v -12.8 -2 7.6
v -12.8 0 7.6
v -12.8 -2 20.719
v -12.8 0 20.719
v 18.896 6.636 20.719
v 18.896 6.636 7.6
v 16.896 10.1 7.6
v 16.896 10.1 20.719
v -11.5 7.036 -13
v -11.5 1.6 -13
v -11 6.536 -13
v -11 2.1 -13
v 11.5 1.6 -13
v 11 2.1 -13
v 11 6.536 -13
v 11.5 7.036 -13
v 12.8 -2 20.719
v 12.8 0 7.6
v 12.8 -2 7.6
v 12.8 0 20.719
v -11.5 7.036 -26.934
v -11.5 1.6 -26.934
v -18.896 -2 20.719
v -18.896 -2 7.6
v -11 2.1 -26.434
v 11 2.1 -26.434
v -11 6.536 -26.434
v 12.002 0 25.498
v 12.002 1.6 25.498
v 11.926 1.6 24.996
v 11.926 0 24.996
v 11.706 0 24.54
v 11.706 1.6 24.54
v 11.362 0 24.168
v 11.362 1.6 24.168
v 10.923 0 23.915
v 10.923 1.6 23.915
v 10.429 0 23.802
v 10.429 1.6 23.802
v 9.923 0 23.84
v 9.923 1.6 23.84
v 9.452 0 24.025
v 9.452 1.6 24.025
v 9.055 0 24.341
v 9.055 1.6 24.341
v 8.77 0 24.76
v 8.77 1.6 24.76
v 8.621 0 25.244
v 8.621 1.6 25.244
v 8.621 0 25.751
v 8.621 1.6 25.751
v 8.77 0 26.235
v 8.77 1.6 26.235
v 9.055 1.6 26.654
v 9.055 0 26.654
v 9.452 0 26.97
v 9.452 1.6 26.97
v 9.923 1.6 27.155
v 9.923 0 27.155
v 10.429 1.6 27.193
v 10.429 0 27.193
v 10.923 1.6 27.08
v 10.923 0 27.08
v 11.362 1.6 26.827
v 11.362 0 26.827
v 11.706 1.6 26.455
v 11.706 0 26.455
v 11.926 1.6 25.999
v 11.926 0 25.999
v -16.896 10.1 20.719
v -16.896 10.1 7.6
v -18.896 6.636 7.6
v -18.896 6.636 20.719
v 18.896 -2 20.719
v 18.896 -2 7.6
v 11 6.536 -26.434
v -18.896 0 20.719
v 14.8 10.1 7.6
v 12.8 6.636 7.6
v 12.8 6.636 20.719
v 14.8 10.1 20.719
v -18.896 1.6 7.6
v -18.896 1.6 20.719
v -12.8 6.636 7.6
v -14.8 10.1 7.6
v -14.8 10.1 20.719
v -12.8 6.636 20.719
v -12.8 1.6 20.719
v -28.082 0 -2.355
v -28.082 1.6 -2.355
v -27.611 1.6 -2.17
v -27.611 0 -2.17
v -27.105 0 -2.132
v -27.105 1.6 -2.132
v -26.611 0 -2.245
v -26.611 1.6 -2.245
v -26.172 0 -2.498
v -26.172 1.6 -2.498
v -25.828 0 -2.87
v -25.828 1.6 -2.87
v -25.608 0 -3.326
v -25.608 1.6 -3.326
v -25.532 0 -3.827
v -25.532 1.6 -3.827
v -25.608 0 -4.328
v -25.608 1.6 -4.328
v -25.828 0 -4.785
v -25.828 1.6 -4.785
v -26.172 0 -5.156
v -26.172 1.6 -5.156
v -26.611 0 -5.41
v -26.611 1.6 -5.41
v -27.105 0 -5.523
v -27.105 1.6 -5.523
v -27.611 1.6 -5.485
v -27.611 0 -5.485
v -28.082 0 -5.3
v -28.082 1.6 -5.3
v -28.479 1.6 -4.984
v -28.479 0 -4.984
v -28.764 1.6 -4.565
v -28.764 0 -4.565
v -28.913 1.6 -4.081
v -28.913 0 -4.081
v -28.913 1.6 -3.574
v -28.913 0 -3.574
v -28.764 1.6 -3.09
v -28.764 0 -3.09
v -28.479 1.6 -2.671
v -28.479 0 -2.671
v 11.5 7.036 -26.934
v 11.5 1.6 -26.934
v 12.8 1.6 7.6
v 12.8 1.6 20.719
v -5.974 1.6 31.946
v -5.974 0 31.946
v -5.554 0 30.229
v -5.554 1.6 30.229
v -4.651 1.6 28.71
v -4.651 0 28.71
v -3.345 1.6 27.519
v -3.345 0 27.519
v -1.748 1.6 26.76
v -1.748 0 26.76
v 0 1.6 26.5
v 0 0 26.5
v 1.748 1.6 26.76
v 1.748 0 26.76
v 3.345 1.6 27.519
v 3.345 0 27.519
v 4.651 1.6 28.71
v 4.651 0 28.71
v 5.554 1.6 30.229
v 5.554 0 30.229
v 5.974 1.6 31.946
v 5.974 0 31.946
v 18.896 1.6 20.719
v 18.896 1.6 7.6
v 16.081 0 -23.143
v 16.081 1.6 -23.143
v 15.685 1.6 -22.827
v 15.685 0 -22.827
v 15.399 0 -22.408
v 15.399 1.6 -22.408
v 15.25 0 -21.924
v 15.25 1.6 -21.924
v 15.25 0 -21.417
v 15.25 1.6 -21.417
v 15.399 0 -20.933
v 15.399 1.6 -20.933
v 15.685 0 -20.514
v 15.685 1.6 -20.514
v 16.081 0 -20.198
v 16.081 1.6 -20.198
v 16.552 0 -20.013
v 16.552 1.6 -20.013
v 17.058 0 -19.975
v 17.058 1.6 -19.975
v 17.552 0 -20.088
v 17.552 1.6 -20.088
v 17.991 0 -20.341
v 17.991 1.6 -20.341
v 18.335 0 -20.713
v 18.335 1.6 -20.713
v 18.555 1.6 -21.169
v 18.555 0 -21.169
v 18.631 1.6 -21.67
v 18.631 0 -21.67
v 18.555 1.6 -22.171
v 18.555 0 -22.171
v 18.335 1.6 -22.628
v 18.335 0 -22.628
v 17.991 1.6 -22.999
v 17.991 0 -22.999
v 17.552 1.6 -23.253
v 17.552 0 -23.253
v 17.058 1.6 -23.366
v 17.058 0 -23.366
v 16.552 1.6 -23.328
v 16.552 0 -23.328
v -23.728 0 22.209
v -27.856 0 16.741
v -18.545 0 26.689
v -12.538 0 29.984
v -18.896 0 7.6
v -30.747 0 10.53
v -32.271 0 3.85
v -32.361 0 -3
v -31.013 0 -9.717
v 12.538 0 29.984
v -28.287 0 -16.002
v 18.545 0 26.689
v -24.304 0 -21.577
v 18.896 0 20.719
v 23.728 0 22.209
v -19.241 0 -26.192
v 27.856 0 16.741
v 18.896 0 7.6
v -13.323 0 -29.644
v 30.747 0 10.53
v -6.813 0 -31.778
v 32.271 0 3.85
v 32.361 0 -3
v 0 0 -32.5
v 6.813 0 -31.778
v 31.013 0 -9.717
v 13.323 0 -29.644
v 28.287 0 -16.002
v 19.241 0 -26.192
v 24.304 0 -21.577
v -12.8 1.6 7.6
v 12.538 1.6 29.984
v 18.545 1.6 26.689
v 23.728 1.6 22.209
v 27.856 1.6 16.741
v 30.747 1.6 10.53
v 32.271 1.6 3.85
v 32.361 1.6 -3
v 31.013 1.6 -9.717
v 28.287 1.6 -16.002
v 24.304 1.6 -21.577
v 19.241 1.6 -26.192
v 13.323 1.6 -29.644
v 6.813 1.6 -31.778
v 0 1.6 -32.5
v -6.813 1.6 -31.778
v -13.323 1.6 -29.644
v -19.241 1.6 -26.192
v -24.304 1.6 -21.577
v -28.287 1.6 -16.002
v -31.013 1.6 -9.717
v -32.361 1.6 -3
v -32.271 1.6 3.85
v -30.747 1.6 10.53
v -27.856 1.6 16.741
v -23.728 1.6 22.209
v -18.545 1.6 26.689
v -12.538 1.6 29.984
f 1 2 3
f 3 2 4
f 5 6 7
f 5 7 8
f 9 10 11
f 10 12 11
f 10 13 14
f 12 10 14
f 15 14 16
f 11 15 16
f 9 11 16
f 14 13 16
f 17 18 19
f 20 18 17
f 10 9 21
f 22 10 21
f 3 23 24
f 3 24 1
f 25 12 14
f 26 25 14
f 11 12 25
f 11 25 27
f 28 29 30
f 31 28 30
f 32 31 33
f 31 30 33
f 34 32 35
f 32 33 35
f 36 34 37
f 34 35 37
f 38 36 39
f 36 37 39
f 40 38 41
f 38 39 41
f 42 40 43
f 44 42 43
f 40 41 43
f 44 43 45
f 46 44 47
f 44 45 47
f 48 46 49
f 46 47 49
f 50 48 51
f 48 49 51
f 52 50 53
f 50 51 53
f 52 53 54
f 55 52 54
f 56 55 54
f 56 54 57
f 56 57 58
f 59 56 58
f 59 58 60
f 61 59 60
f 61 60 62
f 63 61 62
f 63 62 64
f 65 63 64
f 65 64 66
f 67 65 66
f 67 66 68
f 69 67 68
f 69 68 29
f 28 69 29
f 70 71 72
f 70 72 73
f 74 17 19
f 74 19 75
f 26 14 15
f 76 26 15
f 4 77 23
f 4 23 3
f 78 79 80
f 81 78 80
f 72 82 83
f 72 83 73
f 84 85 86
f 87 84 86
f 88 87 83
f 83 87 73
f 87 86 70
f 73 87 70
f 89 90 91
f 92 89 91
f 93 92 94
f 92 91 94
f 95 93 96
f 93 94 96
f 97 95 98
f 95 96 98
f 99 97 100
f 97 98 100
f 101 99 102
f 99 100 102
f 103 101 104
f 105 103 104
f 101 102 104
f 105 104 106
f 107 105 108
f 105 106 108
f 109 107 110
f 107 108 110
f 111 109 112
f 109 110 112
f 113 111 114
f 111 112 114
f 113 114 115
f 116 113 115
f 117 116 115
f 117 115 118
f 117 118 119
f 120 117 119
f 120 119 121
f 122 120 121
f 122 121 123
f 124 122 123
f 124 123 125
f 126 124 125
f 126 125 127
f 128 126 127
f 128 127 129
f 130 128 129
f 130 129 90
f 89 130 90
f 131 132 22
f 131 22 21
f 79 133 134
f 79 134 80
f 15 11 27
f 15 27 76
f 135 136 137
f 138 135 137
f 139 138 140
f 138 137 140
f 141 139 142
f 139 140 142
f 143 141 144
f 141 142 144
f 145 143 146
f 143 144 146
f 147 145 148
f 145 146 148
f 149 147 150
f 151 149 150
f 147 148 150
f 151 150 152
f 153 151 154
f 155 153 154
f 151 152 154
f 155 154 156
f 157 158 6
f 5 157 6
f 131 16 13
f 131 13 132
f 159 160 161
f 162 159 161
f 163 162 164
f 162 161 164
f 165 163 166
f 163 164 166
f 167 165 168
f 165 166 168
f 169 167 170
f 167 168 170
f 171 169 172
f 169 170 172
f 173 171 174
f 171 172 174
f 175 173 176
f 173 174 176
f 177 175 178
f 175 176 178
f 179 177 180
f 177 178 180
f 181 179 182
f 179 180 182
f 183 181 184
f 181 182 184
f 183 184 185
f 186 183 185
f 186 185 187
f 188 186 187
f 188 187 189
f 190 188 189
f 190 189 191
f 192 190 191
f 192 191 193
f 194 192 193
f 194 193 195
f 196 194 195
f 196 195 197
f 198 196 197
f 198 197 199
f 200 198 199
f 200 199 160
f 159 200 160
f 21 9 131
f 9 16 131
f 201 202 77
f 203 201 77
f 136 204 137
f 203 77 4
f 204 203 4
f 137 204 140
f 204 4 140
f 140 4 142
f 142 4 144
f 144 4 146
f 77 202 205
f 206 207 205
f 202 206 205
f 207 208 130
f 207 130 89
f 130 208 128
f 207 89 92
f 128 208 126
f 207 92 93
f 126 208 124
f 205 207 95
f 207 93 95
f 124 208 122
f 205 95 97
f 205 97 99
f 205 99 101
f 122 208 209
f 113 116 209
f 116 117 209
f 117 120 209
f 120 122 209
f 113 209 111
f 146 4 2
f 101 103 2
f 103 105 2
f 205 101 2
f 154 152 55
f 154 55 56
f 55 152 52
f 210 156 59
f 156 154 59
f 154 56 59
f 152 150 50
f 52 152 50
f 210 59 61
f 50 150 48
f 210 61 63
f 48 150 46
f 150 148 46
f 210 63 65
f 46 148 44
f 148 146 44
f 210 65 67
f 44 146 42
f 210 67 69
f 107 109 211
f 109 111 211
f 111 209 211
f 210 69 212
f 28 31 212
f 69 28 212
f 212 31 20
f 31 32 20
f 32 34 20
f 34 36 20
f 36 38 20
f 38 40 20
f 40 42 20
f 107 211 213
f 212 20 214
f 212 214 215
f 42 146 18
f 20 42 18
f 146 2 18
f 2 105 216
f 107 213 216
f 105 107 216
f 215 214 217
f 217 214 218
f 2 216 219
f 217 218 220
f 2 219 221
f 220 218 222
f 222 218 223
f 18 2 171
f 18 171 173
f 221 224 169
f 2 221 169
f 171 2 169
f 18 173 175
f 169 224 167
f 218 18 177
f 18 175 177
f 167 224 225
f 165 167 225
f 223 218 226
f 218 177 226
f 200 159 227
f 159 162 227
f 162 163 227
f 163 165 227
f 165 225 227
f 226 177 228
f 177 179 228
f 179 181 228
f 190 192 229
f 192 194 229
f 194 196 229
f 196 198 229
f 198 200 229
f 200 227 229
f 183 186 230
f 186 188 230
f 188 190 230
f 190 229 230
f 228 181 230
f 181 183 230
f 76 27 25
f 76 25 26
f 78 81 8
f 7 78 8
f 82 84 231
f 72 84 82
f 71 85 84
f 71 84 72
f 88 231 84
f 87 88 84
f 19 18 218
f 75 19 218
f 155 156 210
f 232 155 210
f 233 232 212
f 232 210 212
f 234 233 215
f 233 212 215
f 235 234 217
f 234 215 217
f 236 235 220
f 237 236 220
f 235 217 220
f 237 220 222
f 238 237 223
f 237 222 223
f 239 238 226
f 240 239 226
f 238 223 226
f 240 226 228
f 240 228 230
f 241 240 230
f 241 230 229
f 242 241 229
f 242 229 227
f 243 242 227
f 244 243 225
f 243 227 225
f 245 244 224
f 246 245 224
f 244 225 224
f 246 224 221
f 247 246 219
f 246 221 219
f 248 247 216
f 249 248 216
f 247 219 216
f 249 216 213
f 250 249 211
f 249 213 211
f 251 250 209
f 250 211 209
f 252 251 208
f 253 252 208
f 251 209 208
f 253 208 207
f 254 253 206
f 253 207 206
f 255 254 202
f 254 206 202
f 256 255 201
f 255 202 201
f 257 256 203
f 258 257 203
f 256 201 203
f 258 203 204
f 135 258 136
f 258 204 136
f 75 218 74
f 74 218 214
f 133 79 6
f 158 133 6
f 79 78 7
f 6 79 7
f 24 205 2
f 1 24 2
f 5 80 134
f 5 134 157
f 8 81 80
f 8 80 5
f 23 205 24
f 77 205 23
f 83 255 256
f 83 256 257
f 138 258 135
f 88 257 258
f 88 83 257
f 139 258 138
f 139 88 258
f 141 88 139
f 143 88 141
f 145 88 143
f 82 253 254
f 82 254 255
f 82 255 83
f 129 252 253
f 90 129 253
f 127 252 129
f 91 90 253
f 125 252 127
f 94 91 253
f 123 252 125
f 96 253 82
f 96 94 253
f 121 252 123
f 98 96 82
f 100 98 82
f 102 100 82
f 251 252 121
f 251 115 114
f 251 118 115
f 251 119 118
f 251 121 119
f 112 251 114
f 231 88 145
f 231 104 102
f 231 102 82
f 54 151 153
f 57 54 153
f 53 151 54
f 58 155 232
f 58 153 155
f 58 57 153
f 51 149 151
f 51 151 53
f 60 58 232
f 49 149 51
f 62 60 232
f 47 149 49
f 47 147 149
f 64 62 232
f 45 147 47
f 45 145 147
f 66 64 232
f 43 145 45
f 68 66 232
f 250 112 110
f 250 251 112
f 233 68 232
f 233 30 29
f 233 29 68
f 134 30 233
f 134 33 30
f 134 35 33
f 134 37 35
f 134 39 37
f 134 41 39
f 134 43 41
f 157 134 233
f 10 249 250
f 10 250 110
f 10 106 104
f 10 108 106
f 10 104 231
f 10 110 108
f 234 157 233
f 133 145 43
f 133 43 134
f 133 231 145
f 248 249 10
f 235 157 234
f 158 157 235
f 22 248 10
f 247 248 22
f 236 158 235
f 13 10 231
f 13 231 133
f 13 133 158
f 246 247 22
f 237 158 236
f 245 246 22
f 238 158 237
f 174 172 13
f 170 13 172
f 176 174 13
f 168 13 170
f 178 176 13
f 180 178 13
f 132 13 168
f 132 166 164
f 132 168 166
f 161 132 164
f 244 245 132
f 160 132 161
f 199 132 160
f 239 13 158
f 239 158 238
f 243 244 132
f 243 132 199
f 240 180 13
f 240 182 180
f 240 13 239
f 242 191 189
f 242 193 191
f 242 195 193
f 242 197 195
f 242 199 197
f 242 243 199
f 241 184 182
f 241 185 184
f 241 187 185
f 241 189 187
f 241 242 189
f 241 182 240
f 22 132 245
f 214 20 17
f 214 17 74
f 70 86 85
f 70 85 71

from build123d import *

# Parameters (mm, degrees)
BOSS_EXTRUDE2_DEPTH       = 1.6
SKETCH3_R                 = 1.7
CUT_EXTRUDE1_DEPTH        = 2.6
CIRPATTERN1_COUNT         = 3
SKETCH4_W                 = 13.934293336
SKETCH4_H                 = 5.4356
BOSS_EXTRUDE3_DEPTH       = 11.5
SKETCH5_W                 = 6.096
SKETCH5_H                 = 8.5
BOSS_EXTRUDE4_DEPTH       = 13.1191
CHAMFER1_SIZE             = 2
CHAMFER1_SIZE2            = 3.464101615
CHAMFER1_OF_MIRROR1_SIZE2 = 2
CHAMFER1_OF_MIRROR1_SIZE  = 3.464101615
SKETCH6_W                 = 22
SKETCH6_H                 = 4.4356
CUT_EXTRUDE2_DEPTH        = 13.434293
SKETCH8_W                 = 6.096
SKETCH8_H                 = 13.1191
BOSS_EXTRUDE5_DEPTH       = 2


with BuildPart() as part:
    # Sketch2 → Boss-Extrude2 (new body)
    with BuildSketch(Plane(origin=(0, 0, 0), x_dir=(1, 0, 0), z_dir=(0, 1, 0))):
        with BuildLine():
            ThreePointArc((5.974383185, -31.946153846), (0, 32.5), (-5.974383185, -31.946153846))
            ThreePointArc((-5.974383185, -31.946153846), (0, -26.5), (5.974383185, -31.946153846))
        make_face()
    extrude(amount=BOSS_EXTRUDE2_DEPTH)

    # Sketch3 → Cut-Extrude1 (cut, through all)
    with BuildSketch(Plane(origin=(0, 1.6, 0), x_dir=(1, 0, 0), z_dir=(0, 1, 0))):
        with Locations((10.301681319, -25.497556001)):
            Circle(SKETCH3_R)
    cut_extrude1 = extrude(amount=-CUT_EXTRUDE1_DEPTH, mode=Mode.SUBTRACT)

    # CirPattern1: Cut-Extrude1 ×3 about axis
    cirpattern1_axis = Axis((0, 0, 0), (0, 1, 0))
    for i in range(1, CIRPATTERN1_COUNT):
        add(cut_extrude1.rotate(cirpattern1_axis, i * 360 / CIRPATTERN1_COUNT), mode=Mode.SUBTRACT)

    # Sketch4 → Boss-Extrude3 (add, symmetric)
    with BuildSketch(Plane(origin=(0, 0, 0), x_dir=(0, 0, -1), z_dir=(1, 0, 0))):
        with Locations((19.967146668, 4.3178)):
            Rectangle(SKETCH4_W, SKETCH4_H)
    extrude(amount=BOSS_EXTRUDE3_DEPTH, both=True)

    # Sketch5 → Boss-Extrude4 (add)
    with BuildSketch(Plane.XY.offset(7.6)):
        with Locations((15.848, 5.85)):
            Rectangle(SKETCH5_W, SKETCH5_H)
    boss_extrude4 = extrude(amount=BOSS_EXTRUDE4_DEPTH)

    # Chamfer1
    chamfer1_edges = [part.edges().sort_by_distance(p)[0] for p in [
        (12.8, 10.1, 14.15955),
        (18.896, 10.1, 14.15955),
    ]]
    chamfer1_side = [part.faces().sort_by_distance(p)[0] for p in [
        (15.848, 10.1, 14.15955),
    ]]
    chamfer(chamfer1_edges, length=CHAMFER1_SIZE, length2=CHAMFER1_SIZE2, reference=chamfer1_side[0])

    # Mirror1: Boss-Extrude4 across plane
    add(boss_extrude4.mirror(Plane(origin=(0, 0, 0), x_dir=(0, 0, 1), z_dir=(1, 0, 0))))

    # Chamfer1 of Mirror1
    chamfer1_of_mirror1_edges = [part.edges().sort_by_distance(p)[0] for p in [
        (-12.8, 10.1, 14.15955),
        (-18.896, 10.1, 14.15955),
    ]]
    chamfer(chamfer1_of_mirror1_edges, length=CHAMFER1_OF_MIRROR1_SIZE, length2=CHAMFER1_OF_MIRROR1_SIZE2)

    # Sketch6 → Cut-Extrude2 (cut)
    with BuildSketch(Plane.XY.offset(-13)):
        with Locations((0, 4.3178)):
            Rectangle(SKETCH6_W, SKETCH6_H)
    extrude(amount=-CUT_EXTRUDE2_DEPTH, mode=Mode.SUBTRACT)

    # Sketch8 → Boss-Extrude5 (add)
    with BuildSketch(Plane.XZ):
        with Locations((15.848, 14.15955)):
            Rectangle(SKETCH8_W, SKETCH8_H)
        with Locations((-15.848, 14.15955)):
            Rectangle(SKETCH8_W, SKETCH8_H)
    extrude(amount=BOSS_EXTRUDE5_DEPTH)


solid = part.part
